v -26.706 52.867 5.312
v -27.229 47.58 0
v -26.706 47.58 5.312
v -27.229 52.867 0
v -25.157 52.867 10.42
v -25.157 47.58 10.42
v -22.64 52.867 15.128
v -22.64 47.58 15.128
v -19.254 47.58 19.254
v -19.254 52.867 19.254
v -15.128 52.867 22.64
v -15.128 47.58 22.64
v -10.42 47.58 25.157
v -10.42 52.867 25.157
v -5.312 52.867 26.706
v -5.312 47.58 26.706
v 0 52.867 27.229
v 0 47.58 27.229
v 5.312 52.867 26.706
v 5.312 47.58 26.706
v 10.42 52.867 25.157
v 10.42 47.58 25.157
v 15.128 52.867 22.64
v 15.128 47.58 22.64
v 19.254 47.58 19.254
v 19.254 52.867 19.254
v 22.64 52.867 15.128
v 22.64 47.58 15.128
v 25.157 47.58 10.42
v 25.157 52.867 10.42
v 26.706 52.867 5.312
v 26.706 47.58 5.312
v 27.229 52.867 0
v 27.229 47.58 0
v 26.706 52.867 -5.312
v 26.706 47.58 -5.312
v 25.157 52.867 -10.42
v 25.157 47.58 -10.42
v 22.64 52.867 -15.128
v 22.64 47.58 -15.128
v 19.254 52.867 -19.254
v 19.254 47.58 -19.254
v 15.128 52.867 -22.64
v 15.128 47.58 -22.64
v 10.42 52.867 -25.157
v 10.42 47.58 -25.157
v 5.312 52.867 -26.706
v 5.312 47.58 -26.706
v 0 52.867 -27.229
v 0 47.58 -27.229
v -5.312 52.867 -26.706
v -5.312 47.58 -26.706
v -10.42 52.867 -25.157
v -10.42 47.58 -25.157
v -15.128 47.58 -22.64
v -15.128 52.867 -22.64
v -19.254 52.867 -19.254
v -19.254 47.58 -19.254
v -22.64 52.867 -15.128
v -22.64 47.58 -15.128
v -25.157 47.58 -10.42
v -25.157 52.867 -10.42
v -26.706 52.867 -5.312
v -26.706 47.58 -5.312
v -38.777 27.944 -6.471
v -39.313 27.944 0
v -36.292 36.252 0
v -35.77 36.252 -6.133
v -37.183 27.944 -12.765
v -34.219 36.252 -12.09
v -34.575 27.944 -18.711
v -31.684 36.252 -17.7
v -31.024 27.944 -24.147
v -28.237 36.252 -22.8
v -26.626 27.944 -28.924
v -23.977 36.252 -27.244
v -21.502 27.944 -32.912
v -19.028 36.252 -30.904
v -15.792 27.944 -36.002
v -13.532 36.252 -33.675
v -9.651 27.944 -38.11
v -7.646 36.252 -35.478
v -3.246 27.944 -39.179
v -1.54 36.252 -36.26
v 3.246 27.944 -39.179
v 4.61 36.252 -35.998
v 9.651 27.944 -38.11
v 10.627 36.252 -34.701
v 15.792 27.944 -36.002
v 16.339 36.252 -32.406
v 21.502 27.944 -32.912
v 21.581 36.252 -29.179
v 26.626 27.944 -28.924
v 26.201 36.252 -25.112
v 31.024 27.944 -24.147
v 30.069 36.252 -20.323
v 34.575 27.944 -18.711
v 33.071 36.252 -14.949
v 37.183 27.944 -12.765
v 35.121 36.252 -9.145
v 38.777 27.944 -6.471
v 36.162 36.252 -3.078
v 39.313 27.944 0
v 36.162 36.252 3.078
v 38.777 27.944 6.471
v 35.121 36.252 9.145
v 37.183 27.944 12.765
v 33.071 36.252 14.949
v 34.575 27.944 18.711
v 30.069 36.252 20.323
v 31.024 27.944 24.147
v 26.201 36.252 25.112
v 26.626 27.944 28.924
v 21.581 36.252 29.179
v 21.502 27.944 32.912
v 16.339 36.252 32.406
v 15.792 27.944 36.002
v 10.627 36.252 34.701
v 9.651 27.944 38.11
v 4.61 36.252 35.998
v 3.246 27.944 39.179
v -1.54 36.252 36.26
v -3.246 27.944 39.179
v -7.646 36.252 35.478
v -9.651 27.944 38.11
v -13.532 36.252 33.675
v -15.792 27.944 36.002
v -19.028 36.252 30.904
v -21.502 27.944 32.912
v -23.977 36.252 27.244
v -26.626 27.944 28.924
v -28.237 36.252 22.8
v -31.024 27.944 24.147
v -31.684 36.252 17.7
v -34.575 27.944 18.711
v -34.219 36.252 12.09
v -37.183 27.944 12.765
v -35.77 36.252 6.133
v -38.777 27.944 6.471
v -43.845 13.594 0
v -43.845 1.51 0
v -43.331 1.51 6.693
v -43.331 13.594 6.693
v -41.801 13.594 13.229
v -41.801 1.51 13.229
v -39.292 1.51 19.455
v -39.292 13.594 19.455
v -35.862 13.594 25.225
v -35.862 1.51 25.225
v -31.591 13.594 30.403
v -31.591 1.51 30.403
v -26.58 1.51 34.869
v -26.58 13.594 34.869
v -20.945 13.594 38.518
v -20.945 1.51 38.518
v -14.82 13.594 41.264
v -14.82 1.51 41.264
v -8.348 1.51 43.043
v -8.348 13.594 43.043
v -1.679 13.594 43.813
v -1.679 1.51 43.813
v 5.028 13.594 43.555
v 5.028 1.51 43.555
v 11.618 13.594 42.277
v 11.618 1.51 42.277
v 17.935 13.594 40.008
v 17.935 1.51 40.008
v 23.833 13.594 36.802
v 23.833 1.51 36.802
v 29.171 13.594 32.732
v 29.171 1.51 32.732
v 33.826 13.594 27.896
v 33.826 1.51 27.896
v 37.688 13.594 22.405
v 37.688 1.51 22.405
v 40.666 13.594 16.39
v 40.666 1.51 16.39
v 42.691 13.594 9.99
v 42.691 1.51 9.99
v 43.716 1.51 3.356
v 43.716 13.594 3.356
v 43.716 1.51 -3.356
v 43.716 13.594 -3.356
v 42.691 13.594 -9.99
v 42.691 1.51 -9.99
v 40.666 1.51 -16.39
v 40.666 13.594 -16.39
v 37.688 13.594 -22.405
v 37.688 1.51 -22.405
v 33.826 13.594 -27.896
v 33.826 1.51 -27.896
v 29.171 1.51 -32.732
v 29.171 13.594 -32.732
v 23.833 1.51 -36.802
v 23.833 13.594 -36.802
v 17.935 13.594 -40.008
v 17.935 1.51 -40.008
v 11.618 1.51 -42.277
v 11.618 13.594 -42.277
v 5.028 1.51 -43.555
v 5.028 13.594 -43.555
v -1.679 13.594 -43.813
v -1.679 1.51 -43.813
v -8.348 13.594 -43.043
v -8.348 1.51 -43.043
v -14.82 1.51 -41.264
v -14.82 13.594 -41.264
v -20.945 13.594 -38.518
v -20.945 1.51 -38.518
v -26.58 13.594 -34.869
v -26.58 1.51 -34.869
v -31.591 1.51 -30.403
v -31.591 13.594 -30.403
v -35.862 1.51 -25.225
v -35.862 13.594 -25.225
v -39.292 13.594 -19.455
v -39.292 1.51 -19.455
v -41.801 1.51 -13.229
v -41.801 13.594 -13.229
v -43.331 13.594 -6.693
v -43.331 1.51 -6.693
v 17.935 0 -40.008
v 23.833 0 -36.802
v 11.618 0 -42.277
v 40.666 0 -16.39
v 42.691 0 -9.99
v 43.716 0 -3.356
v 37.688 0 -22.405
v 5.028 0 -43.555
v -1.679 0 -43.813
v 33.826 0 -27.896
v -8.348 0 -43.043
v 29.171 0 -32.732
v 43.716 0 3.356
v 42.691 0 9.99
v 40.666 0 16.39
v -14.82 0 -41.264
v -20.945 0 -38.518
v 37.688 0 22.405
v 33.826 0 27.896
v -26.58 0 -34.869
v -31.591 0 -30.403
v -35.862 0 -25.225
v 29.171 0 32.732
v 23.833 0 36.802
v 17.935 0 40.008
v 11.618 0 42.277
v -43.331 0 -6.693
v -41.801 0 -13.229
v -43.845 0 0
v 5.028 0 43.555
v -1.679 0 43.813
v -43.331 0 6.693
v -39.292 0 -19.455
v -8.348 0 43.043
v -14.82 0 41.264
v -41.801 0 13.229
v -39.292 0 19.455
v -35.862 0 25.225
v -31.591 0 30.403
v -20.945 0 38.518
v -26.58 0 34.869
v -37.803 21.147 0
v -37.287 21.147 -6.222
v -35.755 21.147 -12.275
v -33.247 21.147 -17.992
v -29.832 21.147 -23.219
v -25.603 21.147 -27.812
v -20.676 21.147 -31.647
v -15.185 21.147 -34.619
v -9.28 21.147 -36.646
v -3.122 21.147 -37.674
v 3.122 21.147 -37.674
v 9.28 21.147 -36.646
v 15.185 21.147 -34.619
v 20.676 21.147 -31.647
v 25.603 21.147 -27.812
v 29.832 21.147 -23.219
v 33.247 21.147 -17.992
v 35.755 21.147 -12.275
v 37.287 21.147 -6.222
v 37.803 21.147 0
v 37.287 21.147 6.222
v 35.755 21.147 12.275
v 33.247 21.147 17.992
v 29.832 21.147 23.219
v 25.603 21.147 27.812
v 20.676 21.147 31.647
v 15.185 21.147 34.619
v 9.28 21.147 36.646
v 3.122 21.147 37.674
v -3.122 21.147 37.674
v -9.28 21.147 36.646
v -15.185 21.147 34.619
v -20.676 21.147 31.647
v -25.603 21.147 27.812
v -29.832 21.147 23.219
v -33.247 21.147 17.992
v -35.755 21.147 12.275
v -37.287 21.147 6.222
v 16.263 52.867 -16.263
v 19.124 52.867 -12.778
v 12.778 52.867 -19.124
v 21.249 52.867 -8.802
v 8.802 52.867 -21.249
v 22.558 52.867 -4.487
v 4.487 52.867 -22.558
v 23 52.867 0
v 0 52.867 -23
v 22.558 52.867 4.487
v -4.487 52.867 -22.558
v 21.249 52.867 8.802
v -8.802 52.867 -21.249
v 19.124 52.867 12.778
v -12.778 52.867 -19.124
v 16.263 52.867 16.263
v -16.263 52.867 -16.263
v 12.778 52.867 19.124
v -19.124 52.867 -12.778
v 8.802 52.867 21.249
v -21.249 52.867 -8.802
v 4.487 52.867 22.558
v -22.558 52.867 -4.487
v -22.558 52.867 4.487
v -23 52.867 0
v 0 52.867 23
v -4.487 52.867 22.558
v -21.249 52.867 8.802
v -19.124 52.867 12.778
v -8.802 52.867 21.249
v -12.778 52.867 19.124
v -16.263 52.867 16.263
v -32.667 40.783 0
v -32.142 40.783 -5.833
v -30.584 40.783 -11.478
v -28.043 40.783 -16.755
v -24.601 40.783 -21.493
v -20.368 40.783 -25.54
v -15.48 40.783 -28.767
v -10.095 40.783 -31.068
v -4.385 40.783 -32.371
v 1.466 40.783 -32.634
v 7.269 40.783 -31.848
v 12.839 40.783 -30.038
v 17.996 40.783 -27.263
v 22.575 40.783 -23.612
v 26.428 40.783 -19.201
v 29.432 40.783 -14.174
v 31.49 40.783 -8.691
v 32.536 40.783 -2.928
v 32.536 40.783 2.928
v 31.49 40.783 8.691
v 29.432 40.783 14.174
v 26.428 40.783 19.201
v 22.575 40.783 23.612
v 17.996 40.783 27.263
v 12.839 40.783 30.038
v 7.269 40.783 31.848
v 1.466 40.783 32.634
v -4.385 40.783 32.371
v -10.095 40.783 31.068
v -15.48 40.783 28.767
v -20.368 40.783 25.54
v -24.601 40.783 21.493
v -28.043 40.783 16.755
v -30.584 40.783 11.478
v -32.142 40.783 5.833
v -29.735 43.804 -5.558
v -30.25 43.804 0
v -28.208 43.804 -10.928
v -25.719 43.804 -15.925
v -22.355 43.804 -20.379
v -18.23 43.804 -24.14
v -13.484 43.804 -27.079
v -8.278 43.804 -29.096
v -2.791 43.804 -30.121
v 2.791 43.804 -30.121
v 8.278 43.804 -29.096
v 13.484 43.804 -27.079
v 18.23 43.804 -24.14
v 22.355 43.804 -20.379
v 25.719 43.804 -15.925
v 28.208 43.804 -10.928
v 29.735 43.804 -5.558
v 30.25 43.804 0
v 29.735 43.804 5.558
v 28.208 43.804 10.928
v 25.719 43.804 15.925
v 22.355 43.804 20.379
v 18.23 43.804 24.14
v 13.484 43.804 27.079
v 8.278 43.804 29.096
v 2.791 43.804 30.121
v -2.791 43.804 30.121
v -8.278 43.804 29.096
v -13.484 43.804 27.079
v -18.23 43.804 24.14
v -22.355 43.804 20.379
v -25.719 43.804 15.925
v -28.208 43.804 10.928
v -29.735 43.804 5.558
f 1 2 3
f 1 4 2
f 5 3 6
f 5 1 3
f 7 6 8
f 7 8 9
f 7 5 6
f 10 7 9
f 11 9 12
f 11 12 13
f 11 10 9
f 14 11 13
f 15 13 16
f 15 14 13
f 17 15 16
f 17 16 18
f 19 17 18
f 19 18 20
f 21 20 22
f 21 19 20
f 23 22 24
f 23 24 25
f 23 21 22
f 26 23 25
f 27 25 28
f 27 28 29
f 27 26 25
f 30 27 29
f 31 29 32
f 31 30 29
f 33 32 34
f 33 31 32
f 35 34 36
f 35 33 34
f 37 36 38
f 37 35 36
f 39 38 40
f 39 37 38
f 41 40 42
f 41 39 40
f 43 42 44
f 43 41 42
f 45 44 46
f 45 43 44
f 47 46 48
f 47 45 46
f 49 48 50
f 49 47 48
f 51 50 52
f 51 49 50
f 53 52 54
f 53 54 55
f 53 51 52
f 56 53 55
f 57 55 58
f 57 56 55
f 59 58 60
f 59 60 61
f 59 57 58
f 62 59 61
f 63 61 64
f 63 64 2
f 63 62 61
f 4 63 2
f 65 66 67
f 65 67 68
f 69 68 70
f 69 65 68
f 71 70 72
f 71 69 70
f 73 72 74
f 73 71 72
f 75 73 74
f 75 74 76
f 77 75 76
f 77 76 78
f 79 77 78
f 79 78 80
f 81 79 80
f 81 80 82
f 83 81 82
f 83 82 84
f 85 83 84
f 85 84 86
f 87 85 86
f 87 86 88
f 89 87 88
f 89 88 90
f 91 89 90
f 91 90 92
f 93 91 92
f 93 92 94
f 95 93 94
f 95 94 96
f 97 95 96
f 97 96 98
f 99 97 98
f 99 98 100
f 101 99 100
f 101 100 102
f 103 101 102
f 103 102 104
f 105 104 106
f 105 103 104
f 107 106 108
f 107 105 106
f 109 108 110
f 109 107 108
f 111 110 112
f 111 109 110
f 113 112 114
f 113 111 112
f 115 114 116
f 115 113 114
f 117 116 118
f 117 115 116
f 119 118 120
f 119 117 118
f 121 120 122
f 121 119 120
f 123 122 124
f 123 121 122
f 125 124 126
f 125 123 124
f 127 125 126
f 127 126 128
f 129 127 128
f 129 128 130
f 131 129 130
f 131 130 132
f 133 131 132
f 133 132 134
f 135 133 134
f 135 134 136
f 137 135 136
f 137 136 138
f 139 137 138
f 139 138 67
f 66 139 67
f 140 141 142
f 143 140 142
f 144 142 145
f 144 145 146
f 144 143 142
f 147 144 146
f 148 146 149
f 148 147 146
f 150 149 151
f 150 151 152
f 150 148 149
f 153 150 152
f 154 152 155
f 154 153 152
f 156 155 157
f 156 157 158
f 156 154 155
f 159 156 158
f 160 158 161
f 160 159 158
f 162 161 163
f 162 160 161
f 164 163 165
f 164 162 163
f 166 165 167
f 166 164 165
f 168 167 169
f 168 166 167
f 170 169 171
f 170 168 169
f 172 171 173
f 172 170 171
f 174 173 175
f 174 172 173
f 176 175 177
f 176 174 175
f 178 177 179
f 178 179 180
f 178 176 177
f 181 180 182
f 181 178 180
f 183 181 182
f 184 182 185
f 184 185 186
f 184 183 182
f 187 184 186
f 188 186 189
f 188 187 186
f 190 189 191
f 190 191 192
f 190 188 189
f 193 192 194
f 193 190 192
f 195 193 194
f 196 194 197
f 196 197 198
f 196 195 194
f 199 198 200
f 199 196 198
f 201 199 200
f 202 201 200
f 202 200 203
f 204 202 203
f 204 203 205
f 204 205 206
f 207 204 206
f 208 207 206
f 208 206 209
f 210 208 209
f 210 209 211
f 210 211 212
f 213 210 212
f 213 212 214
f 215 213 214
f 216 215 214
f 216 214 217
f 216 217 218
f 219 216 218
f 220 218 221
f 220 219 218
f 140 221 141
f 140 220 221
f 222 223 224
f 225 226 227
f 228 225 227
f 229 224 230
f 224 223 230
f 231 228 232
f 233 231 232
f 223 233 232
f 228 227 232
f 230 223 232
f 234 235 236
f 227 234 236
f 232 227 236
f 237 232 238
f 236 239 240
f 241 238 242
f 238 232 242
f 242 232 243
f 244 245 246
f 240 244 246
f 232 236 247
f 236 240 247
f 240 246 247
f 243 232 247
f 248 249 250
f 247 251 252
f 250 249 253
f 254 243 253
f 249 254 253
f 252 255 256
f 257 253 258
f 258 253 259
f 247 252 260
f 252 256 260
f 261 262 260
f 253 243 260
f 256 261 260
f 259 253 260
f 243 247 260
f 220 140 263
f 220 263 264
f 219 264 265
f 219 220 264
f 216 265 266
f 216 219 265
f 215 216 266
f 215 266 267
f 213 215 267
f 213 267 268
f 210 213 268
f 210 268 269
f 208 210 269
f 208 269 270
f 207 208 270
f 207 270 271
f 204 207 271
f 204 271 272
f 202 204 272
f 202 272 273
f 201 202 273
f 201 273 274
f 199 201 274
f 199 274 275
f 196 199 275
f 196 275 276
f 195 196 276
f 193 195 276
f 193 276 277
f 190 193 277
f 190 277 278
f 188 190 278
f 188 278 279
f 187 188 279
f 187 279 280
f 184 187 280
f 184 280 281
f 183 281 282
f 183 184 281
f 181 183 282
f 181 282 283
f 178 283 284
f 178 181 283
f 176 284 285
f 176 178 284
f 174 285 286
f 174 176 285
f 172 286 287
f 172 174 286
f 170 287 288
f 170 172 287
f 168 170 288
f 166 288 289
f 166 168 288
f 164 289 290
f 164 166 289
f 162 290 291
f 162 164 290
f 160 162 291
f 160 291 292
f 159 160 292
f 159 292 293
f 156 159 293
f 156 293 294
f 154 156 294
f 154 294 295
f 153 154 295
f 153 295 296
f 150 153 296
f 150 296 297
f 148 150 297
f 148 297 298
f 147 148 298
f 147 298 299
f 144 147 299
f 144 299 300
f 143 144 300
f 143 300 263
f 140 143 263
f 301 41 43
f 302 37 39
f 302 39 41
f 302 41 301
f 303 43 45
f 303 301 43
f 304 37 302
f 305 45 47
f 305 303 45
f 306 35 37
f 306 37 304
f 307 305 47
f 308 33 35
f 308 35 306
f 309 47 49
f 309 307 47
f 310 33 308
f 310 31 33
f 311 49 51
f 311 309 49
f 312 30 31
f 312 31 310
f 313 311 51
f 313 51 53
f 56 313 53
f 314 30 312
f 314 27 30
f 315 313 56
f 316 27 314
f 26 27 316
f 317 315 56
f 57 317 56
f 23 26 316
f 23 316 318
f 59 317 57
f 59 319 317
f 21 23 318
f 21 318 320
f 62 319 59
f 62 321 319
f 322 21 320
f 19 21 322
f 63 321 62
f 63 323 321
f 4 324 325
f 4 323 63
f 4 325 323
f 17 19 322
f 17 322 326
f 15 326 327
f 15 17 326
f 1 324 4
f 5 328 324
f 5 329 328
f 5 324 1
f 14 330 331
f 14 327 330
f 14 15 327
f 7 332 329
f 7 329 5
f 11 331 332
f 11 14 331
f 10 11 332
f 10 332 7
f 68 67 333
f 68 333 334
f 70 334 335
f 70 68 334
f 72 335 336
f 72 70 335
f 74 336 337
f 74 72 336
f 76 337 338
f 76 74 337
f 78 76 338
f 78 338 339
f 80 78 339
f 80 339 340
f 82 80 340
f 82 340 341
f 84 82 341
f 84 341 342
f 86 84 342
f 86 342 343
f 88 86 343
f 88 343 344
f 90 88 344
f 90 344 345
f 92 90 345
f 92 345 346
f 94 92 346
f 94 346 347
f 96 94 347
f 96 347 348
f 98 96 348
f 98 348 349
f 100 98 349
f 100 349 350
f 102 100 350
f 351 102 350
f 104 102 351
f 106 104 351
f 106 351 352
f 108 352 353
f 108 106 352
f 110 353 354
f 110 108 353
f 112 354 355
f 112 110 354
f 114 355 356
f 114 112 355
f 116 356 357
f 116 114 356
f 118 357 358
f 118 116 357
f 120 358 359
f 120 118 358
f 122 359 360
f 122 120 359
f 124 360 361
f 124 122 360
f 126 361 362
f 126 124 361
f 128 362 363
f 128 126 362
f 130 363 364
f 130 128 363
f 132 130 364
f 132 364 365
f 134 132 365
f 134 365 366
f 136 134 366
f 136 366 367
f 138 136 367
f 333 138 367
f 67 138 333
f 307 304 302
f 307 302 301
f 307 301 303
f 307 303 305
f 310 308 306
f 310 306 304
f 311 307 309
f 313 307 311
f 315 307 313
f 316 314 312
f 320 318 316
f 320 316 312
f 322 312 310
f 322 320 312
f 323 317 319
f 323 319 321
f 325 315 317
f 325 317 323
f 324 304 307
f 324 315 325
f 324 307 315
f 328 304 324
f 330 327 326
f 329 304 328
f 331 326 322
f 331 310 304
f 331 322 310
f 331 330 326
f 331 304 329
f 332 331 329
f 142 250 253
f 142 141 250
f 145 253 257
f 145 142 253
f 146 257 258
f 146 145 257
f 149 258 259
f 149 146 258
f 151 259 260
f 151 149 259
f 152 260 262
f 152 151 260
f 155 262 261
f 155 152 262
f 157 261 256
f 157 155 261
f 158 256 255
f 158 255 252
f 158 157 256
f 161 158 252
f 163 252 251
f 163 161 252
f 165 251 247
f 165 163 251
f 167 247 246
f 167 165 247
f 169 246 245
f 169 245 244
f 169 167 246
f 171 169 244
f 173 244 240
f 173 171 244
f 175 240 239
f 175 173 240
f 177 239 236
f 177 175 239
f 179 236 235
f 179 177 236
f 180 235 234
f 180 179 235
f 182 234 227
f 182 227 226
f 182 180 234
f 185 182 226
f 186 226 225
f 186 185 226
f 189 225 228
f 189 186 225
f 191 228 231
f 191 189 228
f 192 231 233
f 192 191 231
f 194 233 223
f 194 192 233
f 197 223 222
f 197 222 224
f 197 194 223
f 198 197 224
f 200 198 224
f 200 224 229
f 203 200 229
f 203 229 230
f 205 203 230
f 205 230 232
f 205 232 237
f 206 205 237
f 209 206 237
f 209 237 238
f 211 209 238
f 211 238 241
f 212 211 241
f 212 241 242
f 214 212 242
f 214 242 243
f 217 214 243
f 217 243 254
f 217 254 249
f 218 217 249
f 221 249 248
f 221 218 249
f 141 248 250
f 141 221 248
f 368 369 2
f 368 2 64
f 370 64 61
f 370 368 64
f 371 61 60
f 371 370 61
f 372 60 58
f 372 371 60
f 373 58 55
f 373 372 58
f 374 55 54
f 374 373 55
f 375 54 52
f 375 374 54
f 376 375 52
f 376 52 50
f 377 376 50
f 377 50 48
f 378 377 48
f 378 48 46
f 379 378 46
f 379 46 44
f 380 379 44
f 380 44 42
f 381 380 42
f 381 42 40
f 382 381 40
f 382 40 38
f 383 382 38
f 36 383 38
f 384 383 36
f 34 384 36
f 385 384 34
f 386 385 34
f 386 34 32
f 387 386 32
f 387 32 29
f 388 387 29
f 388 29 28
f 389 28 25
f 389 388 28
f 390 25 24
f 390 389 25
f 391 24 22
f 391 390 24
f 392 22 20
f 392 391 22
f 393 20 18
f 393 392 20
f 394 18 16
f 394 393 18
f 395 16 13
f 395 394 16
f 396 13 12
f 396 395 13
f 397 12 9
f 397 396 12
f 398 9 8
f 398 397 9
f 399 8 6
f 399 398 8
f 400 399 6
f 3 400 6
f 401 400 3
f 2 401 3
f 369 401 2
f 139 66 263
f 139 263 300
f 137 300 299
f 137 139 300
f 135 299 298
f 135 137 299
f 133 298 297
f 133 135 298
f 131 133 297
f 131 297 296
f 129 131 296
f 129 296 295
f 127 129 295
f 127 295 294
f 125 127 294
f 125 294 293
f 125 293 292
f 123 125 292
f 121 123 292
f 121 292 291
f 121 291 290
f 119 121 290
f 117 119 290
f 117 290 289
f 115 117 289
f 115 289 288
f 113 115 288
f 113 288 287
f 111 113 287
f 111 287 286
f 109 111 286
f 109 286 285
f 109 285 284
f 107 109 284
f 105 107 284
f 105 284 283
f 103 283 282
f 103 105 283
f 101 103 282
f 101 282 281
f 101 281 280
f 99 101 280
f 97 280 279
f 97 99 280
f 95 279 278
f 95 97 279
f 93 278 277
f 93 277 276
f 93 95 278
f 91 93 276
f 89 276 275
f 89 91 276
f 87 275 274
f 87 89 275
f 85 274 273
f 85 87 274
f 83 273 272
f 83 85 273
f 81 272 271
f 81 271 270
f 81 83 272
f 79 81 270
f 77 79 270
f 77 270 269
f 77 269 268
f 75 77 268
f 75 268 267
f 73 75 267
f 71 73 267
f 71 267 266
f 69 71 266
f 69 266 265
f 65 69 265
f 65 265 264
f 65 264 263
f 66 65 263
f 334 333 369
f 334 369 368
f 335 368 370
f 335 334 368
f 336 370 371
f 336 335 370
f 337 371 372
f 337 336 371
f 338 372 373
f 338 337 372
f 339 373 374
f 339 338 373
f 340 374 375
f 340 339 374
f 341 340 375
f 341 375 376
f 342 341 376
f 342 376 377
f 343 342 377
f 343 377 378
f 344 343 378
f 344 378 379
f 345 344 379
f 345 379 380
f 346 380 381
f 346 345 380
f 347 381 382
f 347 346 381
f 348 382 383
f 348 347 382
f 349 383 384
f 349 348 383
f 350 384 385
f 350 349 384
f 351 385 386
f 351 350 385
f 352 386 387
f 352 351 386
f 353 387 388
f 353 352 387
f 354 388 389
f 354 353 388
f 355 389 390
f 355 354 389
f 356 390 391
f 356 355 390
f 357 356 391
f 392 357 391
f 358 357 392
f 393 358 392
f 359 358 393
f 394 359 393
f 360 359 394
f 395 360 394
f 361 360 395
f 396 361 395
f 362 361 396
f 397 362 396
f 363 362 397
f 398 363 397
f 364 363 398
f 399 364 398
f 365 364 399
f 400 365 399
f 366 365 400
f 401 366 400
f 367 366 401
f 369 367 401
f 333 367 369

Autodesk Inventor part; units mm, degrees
ref_plane "YZ Plane" through (0, 0, 0) normal (1, 0, 0) x (0, 1, 0)
ref_plane "XZ Plane" through (0, 0, 0) normal (0, 1, 0) x (-1, 0, 0)
ref_plane "XY Plane" through (0, 0, 0) normal (0, 0, 1) x (1, 0, 0)
sketch "Boceto2" plane through (0, 0, 0) normal (0, 0, 1) x (1, 0, 0)
  line L0 (-105.6698, 187.1112) -> (110.1141, 187.1112) construction
  line L1 (110.1141, 187.1112) -> (110.1141, -25.0762) construction
  line L2 (110.1141, -25.0762) -> (-105.6698, -25.0762) construction
  line L3 (-105.6698, -25.0762) -> (-105.6698, 187.1112) construction
  line L4 (0, 0) -> (0, 52.867)
  line L5 (0, 52.867) -> (0, 0)
  line L6 (-43.8447, 1.5105) -> (-43.8447, 13.5944)
  line L7 (-43.8447, 13.5944) -> (-37.8028, 21.1468)
  line L8 (-37.8028, 21.1468) -> (-39.3133, 27.944)
  line L9 (-39.3133, 27.944) -> (-36.2923, 36.2517)
  line L10 (-36.2923, 36.2517) -> (-32.6671, 40.7831)
  line L11 (-32.6671, 40.7831) -> (-30.2503, 43.8041)
  line L12 (-30.2503, 43.8041) -> (-27.2294, 47.5803)
  line L13 (-27.2294, 47.5803) -> (-27.2294, 52.867)
  line L14 (-27.2294, 52.867) -> (-23, 52.867)
  line L15 (0, 52.867) -> (-23, 52.867)
  line L16 (-27.2294, 52.867) -> (-23, 52.867)
  line L17 (0, 0) -> (-43.8447, 0)
  line L18 (-43.8447, 0) -> (-43.8447, 1.5105)
  dimension "d18" = 23
revolve "Revolución1" add sketch "Boceto2" angle 360 about axis through (0, 0, 0) along (0, 1, 0)
properties part number "KINGHT BASE 1.1"
